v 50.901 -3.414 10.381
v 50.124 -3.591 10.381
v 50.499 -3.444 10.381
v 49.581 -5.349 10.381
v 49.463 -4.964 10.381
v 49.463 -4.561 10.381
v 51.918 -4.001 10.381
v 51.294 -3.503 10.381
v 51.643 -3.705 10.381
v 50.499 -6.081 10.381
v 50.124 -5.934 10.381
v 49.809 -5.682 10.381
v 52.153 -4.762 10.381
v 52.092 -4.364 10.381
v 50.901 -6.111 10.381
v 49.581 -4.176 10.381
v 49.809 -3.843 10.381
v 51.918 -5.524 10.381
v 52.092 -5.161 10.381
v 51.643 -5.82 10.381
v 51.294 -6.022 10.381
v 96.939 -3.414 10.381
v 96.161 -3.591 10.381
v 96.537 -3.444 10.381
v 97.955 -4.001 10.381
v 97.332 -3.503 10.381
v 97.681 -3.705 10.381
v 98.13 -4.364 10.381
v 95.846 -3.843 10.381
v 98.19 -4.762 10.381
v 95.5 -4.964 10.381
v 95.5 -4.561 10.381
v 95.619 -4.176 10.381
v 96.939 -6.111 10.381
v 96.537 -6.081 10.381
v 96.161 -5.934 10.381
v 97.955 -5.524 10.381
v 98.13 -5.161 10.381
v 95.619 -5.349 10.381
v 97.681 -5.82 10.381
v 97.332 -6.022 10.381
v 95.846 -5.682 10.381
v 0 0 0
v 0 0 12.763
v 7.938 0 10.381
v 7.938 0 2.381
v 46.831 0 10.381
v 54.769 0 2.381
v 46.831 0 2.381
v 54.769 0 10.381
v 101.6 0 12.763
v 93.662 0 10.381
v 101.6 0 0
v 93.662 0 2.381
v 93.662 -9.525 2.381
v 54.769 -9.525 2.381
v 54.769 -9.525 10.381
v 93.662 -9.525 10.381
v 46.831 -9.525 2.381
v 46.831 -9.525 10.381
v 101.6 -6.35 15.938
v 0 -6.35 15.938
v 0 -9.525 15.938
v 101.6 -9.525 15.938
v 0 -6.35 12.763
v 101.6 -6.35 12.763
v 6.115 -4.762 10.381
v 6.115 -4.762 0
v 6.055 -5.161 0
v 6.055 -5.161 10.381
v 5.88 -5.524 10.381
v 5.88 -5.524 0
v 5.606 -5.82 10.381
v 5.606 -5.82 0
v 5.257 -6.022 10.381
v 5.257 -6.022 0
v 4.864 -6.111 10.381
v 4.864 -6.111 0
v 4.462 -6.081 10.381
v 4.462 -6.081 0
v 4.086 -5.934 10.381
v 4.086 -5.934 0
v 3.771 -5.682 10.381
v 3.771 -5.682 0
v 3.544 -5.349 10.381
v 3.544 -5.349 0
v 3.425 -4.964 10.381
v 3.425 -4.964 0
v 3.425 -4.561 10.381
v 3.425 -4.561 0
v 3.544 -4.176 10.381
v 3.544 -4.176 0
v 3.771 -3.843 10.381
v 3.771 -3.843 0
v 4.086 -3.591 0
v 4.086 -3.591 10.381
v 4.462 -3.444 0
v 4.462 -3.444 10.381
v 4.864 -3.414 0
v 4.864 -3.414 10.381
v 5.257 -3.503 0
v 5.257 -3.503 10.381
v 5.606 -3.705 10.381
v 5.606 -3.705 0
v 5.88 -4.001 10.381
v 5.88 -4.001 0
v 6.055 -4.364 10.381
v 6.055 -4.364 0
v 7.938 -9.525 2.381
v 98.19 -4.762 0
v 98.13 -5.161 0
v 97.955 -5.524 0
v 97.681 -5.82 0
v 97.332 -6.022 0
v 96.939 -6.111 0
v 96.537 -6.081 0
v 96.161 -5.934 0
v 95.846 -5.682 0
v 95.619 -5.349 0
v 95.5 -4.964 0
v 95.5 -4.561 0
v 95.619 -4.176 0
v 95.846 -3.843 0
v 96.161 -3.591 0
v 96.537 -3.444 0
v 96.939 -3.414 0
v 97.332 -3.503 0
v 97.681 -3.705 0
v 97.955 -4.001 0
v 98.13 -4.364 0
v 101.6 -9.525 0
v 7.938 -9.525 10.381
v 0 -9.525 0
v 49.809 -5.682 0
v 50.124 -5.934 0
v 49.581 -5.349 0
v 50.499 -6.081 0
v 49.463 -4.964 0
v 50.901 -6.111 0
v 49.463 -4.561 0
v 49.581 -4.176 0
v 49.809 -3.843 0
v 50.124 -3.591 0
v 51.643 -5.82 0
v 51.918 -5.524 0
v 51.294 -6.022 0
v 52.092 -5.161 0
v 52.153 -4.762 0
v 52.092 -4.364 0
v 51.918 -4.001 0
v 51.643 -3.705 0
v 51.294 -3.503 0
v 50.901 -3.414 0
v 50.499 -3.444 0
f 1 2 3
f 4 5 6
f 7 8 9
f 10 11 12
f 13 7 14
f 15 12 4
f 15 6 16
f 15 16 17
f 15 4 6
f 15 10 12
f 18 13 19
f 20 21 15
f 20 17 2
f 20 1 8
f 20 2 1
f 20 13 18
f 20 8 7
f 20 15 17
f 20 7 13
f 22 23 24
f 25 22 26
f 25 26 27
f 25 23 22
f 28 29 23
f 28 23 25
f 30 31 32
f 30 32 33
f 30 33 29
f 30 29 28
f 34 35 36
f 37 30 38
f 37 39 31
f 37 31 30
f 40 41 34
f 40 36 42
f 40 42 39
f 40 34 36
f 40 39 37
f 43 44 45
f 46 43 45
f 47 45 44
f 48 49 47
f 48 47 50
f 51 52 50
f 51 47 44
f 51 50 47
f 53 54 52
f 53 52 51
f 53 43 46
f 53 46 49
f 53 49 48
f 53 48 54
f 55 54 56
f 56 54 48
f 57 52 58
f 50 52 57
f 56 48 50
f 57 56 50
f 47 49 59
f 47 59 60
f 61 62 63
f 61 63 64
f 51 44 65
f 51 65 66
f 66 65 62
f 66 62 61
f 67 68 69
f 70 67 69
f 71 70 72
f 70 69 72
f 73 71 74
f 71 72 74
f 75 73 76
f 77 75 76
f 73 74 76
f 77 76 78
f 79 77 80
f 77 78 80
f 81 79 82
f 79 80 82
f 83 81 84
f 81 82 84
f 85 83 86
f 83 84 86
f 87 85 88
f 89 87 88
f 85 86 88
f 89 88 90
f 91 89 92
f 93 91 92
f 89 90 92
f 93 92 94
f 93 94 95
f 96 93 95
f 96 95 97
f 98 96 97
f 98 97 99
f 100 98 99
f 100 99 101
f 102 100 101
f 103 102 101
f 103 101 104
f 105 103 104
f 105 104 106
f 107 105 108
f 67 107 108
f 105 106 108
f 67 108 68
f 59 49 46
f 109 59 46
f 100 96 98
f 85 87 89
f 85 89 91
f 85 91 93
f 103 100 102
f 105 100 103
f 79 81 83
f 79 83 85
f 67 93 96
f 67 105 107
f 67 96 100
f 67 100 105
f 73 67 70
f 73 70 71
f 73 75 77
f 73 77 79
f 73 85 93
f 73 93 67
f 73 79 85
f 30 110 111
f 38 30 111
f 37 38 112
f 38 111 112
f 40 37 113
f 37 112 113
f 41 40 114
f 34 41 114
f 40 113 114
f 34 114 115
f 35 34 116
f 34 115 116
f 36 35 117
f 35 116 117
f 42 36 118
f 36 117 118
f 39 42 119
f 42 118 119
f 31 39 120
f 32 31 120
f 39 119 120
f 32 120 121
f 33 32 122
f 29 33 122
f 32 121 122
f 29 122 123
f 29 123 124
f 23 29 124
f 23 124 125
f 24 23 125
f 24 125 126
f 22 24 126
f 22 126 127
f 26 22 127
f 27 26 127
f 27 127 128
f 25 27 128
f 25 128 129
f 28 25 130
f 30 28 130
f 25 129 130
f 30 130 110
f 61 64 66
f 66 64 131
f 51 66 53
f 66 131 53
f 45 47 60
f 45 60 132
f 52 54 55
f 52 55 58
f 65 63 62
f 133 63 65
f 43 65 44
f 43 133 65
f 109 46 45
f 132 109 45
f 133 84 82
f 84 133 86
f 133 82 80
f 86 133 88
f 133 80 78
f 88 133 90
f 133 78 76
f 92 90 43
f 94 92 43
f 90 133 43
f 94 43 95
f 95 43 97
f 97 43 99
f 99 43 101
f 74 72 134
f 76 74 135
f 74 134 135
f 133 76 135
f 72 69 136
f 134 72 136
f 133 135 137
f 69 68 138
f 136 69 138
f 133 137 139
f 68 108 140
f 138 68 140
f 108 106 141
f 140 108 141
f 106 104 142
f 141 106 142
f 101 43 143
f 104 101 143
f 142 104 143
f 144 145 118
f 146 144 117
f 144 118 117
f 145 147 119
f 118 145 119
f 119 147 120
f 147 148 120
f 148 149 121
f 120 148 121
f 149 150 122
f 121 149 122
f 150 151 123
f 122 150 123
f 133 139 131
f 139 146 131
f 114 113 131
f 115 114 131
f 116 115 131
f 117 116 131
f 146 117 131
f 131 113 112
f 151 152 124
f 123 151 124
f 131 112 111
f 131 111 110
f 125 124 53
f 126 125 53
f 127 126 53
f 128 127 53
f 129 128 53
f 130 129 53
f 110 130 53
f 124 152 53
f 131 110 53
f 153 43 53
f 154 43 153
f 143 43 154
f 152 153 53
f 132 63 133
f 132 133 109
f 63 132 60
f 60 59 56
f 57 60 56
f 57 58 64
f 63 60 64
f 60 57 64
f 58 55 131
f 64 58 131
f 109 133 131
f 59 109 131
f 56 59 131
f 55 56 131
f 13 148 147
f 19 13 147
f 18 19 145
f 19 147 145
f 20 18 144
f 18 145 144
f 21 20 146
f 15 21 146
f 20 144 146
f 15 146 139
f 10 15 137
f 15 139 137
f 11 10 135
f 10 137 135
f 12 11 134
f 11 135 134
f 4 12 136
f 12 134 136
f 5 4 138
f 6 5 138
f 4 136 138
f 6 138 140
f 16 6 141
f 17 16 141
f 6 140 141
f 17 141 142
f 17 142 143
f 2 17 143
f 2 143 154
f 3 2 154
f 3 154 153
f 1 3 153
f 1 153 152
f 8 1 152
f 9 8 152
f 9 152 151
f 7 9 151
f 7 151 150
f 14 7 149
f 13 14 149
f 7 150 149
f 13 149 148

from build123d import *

# Parameters (mm, degrees)
F0_W     = 101.6
F0_H     = 9.525
F1_DEPTH = 12.762509
F2_W     = 101.6
F2_H     = 3.175
F3_DEPTH = 3.175
F4_W     = 38.89375
F4_H     = 8.000009
F5_DEPTH = 9.525
F6_R     = 1.35255
F7_DEPTH = 10.381259


with BuildPart() as f1:
    # F0 (on Top) → F1 (new body)
    with BuildSketch(Plane.XY):
        with Locations((50.8, -4.7625)):
            Rectangle(F0_W, F0_H)
    extrude(amount=F1_DEPTH)

    # F2 (on face) → F3 (join)
    with BuildSketch(Plane.XY.offset(12.762509)):
        with Locations((50.8, -7.9375)):
            Rectangle(F2_W, F2_H)
    extrude(amount=F3_DEPTH)

    # F4 (on face) → F5 (cut, through all)
    with BuildSketch(Plane(origin=(0, 0, 0), x_dir=(-1, 0, 0), z_dir=(0, 1, 0))):
        with Locations((-74.215625, 6.381254)):
            Rectangle(F4_W, F4_H)
        with Locations((-27.384375, 6.381254)):
            Rectangle(F4_W, F4_H)
    extrude(amount=-F5_DEPTH, mode=Mode.SUBTRACT)

    # F6 (on face) → F7 (cut, through all)
    with BuildSketch(Plane(origin=(0, 0, 0), x_dir=(1, 0, 0), z_dir=(0, 0, -1))):
        with Locations((96.8375, 4.7625)):
            Circle(F6_R)
        with Locations((50.8, 4.7625)):
            Circle(F6_R)
        with Locations((4.7625, 4.7625)):
            Circle(F6_R)
    extrude(amount=-F7_DEPTH, mode=Mode.SUBTRACT)


solid = f1.part
